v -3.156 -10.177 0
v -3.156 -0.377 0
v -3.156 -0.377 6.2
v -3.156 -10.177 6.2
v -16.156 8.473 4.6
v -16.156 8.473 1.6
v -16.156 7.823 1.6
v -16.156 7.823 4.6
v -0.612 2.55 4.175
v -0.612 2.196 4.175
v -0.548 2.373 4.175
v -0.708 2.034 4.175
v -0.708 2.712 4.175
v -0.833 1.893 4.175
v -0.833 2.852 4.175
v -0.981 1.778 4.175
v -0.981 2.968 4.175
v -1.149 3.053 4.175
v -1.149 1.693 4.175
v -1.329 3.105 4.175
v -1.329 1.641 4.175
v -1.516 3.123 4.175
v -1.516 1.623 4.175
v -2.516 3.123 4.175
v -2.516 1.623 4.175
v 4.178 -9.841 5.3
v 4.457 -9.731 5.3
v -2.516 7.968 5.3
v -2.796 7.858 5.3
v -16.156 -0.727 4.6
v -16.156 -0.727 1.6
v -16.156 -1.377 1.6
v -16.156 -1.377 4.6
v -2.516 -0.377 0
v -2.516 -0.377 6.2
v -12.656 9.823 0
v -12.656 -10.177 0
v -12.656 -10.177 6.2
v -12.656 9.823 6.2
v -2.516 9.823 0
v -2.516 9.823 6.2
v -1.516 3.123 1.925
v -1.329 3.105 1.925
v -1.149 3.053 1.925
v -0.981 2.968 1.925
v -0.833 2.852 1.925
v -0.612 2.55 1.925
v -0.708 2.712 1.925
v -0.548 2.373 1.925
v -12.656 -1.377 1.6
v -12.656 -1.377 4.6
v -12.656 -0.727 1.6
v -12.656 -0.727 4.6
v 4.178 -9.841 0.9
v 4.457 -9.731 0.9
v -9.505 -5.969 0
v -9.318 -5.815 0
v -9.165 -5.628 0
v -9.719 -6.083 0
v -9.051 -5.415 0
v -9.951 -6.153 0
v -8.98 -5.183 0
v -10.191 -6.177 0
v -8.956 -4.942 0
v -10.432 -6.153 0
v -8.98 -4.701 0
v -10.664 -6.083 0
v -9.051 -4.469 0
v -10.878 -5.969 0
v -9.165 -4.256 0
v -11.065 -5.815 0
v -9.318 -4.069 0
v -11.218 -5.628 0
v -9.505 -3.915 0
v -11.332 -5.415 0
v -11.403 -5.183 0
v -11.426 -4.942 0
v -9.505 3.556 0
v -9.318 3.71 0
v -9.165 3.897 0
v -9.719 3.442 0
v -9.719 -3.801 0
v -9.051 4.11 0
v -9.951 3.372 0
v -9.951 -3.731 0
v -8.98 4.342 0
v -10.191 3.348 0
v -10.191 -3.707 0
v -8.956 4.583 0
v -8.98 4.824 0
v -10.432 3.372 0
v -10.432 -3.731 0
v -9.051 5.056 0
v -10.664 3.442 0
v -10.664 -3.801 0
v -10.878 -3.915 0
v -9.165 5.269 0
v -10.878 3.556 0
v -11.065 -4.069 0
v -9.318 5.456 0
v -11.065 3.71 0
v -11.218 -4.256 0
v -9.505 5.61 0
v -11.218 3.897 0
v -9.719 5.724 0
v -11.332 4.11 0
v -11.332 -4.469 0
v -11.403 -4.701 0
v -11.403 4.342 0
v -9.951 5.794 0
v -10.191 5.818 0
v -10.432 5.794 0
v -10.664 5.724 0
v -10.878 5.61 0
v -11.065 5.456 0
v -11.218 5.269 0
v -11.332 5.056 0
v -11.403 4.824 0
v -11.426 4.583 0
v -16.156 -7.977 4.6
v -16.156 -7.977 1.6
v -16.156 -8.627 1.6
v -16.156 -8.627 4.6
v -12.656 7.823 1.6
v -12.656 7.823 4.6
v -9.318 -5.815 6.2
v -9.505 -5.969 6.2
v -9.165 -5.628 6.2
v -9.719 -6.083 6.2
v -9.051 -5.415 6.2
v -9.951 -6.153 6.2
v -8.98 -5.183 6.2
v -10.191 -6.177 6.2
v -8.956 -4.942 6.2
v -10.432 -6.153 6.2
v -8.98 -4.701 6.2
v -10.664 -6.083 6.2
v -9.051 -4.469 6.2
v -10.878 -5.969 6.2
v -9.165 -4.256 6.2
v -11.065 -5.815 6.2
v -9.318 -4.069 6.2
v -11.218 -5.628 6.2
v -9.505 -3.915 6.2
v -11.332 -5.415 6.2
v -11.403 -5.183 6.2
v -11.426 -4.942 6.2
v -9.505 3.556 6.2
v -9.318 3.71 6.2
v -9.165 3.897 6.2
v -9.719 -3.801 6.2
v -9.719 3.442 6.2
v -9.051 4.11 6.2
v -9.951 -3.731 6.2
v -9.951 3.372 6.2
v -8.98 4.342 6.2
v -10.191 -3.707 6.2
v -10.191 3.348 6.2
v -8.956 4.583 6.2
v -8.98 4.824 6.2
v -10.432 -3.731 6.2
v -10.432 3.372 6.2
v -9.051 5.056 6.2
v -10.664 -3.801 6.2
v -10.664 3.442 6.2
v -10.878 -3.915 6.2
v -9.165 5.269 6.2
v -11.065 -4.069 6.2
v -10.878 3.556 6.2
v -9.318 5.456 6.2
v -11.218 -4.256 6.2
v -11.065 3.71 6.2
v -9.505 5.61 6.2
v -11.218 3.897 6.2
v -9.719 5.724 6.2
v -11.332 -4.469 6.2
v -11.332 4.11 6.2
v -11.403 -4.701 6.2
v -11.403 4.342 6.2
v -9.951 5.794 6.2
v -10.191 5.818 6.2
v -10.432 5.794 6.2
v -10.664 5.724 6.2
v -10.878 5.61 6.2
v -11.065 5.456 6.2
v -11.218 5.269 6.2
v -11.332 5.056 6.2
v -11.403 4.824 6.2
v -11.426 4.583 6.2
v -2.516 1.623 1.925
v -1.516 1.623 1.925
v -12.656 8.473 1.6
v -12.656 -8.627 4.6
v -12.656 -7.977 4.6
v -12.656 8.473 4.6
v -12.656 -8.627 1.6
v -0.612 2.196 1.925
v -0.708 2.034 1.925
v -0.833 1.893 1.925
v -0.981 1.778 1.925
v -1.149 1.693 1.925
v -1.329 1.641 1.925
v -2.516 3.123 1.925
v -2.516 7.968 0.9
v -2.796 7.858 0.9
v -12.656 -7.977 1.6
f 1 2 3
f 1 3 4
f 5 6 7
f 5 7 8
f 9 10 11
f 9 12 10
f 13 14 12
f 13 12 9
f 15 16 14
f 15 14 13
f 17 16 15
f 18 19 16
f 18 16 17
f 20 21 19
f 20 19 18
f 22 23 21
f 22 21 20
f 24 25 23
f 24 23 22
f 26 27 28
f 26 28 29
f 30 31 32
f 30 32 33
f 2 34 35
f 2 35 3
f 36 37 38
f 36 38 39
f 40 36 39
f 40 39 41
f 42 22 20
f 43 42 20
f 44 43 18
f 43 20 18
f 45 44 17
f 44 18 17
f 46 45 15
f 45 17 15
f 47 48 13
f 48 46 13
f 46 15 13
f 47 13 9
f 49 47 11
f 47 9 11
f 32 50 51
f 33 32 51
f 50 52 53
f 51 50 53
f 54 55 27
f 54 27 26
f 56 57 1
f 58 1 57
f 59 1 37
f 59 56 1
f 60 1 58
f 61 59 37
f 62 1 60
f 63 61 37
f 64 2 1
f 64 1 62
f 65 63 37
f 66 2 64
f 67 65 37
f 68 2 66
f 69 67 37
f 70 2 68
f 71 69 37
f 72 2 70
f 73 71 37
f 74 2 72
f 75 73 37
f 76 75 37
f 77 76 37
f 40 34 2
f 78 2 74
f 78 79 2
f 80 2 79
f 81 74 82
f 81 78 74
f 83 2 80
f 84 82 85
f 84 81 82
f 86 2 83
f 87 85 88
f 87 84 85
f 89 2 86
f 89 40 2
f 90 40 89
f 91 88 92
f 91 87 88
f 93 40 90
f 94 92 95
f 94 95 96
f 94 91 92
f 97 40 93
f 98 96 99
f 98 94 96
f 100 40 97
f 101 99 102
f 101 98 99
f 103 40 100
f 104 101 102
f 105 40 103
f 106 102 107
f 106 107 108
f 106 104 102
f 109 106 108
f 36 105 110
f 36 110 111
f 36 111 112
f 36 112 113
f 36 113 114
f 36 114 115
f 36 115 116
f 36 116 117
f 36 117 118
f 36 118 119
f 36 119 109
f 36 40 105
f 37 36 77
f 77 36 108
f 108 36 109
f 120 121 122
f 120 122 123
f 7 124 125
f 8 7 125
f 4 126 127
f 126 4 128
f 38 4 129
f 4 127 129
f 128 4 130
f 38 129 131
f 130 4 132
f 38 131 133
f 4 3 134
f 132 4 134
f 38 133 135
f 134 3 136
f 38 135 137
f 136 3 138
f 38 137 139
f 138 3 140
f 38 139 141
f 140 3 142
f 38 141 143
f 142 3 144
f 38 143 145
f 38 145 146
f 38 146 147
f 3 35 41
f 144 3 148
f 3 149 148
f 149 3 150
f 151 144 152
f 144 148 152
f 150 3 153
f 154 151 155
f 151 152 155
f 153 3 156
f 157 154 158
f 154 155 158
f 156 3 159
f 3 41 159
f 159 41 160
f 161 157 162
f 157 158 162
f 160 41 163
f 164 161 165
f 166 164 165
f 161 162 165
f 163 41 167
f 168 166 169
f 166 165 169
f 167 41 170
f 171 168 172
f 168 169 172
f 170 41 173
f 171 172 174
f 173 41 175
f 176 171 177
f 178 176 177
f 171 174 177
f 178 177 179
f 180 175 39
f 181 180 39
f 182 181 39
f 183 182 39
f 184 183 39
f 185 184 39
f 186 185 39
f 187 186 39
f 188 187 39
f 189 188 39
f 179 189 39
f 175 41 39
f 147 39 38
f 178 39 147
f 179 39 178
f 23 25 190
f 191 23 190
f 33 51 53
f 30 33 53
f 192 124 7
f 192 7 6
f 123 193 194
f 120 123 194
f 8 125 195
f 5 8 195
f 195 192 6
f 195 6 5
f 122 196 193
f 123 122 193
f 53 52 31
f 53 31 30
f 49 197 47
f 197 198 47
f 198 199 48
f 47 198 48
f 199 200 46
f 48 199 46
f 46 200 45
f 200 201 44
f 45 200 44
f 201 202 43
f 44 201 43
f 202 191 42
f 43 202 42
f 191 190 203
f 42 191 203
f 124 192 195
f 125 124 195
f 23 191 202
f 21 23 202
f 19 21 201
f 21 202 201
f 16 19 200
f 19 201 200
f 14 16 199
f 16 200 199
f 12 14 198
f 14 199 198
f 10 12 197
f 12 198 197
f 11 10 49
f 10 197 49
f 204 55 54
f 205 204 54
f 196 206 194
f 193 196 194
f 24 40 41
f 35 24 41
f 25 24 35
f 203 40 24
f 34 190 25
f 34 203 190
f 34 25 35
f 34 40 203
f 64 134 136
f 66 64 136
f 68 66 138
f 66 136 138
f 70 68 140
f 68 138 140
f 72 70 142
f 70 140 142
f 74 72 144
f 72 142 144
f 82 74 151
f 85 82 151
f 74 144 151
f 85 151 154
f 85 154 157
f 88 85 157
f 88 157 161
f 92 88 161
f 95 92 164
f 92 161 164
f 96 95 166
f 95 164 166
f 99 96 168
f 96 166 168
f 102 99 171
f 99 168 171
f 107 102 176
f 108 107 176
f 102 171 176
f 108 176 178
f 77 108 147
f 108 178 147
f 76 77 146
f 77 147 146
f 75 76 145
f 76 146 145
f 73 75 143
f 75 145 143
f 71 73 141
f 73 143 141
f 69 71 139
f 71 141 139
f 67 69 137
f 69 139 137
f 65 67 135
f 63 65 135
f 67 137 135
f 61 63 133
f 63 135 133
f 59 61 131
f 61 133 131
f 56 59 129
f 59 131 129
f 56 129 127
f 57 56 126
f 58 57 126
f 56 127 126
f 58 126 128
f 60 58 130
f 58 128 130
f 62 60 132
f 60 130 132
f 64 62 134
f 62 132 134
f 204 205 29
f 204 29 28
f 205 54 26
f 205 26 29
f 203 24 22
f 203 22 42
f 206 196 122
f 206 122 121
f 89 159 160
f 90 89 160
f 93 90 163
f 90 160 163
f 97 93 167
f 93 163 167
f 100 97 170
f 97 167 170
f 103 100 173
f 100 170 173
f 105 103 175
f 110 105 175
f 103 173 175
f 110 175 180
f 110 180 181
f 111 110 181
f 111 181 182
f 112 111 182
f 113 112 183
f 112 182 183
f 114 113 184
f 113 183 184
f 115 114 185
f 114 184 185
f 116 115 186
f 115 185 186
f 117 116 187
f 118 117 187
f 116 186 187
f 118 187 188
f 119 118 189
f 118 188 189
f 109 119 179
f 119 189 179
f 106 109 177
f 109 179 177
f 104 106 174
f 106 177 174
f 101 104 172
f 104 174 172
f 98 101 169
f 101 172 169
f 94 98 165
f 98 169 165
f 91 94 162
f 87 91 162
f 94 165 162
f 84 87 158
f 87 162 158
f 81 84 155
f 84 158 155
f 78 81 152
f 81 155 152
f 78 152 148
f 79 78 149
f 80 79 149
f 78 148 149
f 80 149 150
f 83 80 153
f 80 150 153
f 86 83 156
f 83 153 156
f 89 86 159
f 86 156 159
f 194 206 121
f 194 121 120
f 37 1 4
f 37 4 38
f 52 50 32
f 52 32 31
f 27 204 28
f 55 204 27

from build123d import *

# Parameters (mm, degrees)
BOSS_EXTRUDE1_DEPTH      = 6.2
SKETCH2_W                = 3
SKETCH2_H                = 0.65
BOSS_EXTRUDE2_DEPTH      = 3.5
BOSS_EXTRUDE2_2_DEPTH    = 3.5
BOSS_EXTRUDE2_3_DEPTH    = 3.5
SKETCH3_R                = 1.235
CUT_EXTRUDE1_DEPTH       = 6.2
SKETCH4_W                = 2.25
SKETCH4_H                = 1.5
BOSS_EXTRUDE4_DEPTH      = 2
FILLET1_R                = 1
BOSS_EXTRUDE5_DEPTH      = 2.2
BOSS_EXTRUDE5_DEPTH_BACK = 2.2


with BuildPart() as part:
    # Sketch1 → Boss-Extrude1 (new body)
    with BuildSketch(Plane.XY):
        Polygon((-2.51649635, -0.377007299), (-3.15649635, -0.377007299), (-3.15649635, -10.177007299), (-12.65649635, -10.177007299), (-12.65649635, 9.822992701), (-2.51649635, 9.822992701), align=None)
    extrude(amount=BOSS_EXTRUDE1_DEPTH)

    # Sketch3 → Cut-Extrude1 (cut)
    with BuildSketch(Plane.XY.offset(6.2)):
        with Locations((-10.19149635, 4.582992701)):
            Circle(SKETCH3_R)
        with Locations((-10.19149635, -4.942007299)):
            Circle(SKETCH3_R)
    extrude(amount=-CUT_EXTRUDE1_DEPTH, mode=Mode.SUBTRACT)

    # Sketch4 → Boss-Extrude4 (add)
    with BuildSketch(Plane(origin=(-2.51649635, 0, 0), x_dir=(0, 0, -1), z_dir=(1, 0, 0))):
        with Locations((-3.05, 2.372992701)):
            Rectangle(SKETCH4_W, SKETCH4_H)
    extrude(amount=BOSS_EXTRUDE4_DEPTH)

    # Fillet1
    # the kernel refuses this fillet: 1 mm, written as the material it takes off along each edge
    with BuildSketch(Plane(origin=(-0.51649635, 3.122992701, 6.675), x_dir=(-1, 0, 0), z_dir=(0, 0, -1)), Plane(origin=(-0.51649635, 1.622992701, -0.575), x_dir=(-1, 0, 0), z_dir=(0, 0, 1))) as fillet1_piece_1:
        with BuildLine():
            CenterArc((FILLET1_R, -FILLET1_R), FILLET1_R, 90, 90)
            Line((0, -FILLET1_R), (0, 0))
            Line((0, 0), (FILLET1_R, 0))
        make_face()
    extrude(amount=7.25, mode=Mode.SUBTRACT)


with BuildPart() as body_2:
    # Sketch2 → Boss-Extrude2 (new body)
    with BuildSketch(Plane.ZY.offset(12.65649635)):
        with Locations((3.1, 8.147992701)):
            Rectangle(SKETCH2_W, SKETCH2_H)
    extrude(amount=BOSS_EXTRUDE2_DEPTH)


with BuildPart() as body_3:
    # Sketch2 → Boss-Extrude2 2 (new body)
    with BuildSketch(Plane.ZY.offset(12.65649635)):
        with Locations((3.1, -1.052007299)):
            Rectangle(SKETCH2_W, SKETCH2_H)
    extrude(amount=BOSS_EXTRUDE2_2_DEPTH)


with BuildPart() as body_4:
    # Sketch2 → Boss-Extrude2 3 (new body)
    with BuildSketch(Plane.ZY.offset(12.65649635)):
        with Locations((3.1, -8.302007299)):
            Rectangle(SKETCH2_W, SKETCH2_H)
    extrude(amount=BOSS_EXTRUDE2_3_DEPTH)


with BuildPart() as body_5:
    # Sketch5 → Boss-Extrude5 (new, two sides: drawn at the far end of the back side and taken through both)
    with BuildSketch(Plane.XY.offset(3.1).offset(-BOSS_EXTRUDE5_DEPTH_BACK)):
        Polygon((-2.51649635, 7.968450239), (4.457309504, -9.731345212), (4.17819322, -9.841318391), (-2.795612634, 7.85847706), align=None)
    extrude(amount=BOSS_EXTRUDE5_DEPTH + BOSS_EXTRUDE5_DEPTH_BACK)


solid = Compound([part.part, body_2.part, body_3.part, body_4.part, body_5.part])
